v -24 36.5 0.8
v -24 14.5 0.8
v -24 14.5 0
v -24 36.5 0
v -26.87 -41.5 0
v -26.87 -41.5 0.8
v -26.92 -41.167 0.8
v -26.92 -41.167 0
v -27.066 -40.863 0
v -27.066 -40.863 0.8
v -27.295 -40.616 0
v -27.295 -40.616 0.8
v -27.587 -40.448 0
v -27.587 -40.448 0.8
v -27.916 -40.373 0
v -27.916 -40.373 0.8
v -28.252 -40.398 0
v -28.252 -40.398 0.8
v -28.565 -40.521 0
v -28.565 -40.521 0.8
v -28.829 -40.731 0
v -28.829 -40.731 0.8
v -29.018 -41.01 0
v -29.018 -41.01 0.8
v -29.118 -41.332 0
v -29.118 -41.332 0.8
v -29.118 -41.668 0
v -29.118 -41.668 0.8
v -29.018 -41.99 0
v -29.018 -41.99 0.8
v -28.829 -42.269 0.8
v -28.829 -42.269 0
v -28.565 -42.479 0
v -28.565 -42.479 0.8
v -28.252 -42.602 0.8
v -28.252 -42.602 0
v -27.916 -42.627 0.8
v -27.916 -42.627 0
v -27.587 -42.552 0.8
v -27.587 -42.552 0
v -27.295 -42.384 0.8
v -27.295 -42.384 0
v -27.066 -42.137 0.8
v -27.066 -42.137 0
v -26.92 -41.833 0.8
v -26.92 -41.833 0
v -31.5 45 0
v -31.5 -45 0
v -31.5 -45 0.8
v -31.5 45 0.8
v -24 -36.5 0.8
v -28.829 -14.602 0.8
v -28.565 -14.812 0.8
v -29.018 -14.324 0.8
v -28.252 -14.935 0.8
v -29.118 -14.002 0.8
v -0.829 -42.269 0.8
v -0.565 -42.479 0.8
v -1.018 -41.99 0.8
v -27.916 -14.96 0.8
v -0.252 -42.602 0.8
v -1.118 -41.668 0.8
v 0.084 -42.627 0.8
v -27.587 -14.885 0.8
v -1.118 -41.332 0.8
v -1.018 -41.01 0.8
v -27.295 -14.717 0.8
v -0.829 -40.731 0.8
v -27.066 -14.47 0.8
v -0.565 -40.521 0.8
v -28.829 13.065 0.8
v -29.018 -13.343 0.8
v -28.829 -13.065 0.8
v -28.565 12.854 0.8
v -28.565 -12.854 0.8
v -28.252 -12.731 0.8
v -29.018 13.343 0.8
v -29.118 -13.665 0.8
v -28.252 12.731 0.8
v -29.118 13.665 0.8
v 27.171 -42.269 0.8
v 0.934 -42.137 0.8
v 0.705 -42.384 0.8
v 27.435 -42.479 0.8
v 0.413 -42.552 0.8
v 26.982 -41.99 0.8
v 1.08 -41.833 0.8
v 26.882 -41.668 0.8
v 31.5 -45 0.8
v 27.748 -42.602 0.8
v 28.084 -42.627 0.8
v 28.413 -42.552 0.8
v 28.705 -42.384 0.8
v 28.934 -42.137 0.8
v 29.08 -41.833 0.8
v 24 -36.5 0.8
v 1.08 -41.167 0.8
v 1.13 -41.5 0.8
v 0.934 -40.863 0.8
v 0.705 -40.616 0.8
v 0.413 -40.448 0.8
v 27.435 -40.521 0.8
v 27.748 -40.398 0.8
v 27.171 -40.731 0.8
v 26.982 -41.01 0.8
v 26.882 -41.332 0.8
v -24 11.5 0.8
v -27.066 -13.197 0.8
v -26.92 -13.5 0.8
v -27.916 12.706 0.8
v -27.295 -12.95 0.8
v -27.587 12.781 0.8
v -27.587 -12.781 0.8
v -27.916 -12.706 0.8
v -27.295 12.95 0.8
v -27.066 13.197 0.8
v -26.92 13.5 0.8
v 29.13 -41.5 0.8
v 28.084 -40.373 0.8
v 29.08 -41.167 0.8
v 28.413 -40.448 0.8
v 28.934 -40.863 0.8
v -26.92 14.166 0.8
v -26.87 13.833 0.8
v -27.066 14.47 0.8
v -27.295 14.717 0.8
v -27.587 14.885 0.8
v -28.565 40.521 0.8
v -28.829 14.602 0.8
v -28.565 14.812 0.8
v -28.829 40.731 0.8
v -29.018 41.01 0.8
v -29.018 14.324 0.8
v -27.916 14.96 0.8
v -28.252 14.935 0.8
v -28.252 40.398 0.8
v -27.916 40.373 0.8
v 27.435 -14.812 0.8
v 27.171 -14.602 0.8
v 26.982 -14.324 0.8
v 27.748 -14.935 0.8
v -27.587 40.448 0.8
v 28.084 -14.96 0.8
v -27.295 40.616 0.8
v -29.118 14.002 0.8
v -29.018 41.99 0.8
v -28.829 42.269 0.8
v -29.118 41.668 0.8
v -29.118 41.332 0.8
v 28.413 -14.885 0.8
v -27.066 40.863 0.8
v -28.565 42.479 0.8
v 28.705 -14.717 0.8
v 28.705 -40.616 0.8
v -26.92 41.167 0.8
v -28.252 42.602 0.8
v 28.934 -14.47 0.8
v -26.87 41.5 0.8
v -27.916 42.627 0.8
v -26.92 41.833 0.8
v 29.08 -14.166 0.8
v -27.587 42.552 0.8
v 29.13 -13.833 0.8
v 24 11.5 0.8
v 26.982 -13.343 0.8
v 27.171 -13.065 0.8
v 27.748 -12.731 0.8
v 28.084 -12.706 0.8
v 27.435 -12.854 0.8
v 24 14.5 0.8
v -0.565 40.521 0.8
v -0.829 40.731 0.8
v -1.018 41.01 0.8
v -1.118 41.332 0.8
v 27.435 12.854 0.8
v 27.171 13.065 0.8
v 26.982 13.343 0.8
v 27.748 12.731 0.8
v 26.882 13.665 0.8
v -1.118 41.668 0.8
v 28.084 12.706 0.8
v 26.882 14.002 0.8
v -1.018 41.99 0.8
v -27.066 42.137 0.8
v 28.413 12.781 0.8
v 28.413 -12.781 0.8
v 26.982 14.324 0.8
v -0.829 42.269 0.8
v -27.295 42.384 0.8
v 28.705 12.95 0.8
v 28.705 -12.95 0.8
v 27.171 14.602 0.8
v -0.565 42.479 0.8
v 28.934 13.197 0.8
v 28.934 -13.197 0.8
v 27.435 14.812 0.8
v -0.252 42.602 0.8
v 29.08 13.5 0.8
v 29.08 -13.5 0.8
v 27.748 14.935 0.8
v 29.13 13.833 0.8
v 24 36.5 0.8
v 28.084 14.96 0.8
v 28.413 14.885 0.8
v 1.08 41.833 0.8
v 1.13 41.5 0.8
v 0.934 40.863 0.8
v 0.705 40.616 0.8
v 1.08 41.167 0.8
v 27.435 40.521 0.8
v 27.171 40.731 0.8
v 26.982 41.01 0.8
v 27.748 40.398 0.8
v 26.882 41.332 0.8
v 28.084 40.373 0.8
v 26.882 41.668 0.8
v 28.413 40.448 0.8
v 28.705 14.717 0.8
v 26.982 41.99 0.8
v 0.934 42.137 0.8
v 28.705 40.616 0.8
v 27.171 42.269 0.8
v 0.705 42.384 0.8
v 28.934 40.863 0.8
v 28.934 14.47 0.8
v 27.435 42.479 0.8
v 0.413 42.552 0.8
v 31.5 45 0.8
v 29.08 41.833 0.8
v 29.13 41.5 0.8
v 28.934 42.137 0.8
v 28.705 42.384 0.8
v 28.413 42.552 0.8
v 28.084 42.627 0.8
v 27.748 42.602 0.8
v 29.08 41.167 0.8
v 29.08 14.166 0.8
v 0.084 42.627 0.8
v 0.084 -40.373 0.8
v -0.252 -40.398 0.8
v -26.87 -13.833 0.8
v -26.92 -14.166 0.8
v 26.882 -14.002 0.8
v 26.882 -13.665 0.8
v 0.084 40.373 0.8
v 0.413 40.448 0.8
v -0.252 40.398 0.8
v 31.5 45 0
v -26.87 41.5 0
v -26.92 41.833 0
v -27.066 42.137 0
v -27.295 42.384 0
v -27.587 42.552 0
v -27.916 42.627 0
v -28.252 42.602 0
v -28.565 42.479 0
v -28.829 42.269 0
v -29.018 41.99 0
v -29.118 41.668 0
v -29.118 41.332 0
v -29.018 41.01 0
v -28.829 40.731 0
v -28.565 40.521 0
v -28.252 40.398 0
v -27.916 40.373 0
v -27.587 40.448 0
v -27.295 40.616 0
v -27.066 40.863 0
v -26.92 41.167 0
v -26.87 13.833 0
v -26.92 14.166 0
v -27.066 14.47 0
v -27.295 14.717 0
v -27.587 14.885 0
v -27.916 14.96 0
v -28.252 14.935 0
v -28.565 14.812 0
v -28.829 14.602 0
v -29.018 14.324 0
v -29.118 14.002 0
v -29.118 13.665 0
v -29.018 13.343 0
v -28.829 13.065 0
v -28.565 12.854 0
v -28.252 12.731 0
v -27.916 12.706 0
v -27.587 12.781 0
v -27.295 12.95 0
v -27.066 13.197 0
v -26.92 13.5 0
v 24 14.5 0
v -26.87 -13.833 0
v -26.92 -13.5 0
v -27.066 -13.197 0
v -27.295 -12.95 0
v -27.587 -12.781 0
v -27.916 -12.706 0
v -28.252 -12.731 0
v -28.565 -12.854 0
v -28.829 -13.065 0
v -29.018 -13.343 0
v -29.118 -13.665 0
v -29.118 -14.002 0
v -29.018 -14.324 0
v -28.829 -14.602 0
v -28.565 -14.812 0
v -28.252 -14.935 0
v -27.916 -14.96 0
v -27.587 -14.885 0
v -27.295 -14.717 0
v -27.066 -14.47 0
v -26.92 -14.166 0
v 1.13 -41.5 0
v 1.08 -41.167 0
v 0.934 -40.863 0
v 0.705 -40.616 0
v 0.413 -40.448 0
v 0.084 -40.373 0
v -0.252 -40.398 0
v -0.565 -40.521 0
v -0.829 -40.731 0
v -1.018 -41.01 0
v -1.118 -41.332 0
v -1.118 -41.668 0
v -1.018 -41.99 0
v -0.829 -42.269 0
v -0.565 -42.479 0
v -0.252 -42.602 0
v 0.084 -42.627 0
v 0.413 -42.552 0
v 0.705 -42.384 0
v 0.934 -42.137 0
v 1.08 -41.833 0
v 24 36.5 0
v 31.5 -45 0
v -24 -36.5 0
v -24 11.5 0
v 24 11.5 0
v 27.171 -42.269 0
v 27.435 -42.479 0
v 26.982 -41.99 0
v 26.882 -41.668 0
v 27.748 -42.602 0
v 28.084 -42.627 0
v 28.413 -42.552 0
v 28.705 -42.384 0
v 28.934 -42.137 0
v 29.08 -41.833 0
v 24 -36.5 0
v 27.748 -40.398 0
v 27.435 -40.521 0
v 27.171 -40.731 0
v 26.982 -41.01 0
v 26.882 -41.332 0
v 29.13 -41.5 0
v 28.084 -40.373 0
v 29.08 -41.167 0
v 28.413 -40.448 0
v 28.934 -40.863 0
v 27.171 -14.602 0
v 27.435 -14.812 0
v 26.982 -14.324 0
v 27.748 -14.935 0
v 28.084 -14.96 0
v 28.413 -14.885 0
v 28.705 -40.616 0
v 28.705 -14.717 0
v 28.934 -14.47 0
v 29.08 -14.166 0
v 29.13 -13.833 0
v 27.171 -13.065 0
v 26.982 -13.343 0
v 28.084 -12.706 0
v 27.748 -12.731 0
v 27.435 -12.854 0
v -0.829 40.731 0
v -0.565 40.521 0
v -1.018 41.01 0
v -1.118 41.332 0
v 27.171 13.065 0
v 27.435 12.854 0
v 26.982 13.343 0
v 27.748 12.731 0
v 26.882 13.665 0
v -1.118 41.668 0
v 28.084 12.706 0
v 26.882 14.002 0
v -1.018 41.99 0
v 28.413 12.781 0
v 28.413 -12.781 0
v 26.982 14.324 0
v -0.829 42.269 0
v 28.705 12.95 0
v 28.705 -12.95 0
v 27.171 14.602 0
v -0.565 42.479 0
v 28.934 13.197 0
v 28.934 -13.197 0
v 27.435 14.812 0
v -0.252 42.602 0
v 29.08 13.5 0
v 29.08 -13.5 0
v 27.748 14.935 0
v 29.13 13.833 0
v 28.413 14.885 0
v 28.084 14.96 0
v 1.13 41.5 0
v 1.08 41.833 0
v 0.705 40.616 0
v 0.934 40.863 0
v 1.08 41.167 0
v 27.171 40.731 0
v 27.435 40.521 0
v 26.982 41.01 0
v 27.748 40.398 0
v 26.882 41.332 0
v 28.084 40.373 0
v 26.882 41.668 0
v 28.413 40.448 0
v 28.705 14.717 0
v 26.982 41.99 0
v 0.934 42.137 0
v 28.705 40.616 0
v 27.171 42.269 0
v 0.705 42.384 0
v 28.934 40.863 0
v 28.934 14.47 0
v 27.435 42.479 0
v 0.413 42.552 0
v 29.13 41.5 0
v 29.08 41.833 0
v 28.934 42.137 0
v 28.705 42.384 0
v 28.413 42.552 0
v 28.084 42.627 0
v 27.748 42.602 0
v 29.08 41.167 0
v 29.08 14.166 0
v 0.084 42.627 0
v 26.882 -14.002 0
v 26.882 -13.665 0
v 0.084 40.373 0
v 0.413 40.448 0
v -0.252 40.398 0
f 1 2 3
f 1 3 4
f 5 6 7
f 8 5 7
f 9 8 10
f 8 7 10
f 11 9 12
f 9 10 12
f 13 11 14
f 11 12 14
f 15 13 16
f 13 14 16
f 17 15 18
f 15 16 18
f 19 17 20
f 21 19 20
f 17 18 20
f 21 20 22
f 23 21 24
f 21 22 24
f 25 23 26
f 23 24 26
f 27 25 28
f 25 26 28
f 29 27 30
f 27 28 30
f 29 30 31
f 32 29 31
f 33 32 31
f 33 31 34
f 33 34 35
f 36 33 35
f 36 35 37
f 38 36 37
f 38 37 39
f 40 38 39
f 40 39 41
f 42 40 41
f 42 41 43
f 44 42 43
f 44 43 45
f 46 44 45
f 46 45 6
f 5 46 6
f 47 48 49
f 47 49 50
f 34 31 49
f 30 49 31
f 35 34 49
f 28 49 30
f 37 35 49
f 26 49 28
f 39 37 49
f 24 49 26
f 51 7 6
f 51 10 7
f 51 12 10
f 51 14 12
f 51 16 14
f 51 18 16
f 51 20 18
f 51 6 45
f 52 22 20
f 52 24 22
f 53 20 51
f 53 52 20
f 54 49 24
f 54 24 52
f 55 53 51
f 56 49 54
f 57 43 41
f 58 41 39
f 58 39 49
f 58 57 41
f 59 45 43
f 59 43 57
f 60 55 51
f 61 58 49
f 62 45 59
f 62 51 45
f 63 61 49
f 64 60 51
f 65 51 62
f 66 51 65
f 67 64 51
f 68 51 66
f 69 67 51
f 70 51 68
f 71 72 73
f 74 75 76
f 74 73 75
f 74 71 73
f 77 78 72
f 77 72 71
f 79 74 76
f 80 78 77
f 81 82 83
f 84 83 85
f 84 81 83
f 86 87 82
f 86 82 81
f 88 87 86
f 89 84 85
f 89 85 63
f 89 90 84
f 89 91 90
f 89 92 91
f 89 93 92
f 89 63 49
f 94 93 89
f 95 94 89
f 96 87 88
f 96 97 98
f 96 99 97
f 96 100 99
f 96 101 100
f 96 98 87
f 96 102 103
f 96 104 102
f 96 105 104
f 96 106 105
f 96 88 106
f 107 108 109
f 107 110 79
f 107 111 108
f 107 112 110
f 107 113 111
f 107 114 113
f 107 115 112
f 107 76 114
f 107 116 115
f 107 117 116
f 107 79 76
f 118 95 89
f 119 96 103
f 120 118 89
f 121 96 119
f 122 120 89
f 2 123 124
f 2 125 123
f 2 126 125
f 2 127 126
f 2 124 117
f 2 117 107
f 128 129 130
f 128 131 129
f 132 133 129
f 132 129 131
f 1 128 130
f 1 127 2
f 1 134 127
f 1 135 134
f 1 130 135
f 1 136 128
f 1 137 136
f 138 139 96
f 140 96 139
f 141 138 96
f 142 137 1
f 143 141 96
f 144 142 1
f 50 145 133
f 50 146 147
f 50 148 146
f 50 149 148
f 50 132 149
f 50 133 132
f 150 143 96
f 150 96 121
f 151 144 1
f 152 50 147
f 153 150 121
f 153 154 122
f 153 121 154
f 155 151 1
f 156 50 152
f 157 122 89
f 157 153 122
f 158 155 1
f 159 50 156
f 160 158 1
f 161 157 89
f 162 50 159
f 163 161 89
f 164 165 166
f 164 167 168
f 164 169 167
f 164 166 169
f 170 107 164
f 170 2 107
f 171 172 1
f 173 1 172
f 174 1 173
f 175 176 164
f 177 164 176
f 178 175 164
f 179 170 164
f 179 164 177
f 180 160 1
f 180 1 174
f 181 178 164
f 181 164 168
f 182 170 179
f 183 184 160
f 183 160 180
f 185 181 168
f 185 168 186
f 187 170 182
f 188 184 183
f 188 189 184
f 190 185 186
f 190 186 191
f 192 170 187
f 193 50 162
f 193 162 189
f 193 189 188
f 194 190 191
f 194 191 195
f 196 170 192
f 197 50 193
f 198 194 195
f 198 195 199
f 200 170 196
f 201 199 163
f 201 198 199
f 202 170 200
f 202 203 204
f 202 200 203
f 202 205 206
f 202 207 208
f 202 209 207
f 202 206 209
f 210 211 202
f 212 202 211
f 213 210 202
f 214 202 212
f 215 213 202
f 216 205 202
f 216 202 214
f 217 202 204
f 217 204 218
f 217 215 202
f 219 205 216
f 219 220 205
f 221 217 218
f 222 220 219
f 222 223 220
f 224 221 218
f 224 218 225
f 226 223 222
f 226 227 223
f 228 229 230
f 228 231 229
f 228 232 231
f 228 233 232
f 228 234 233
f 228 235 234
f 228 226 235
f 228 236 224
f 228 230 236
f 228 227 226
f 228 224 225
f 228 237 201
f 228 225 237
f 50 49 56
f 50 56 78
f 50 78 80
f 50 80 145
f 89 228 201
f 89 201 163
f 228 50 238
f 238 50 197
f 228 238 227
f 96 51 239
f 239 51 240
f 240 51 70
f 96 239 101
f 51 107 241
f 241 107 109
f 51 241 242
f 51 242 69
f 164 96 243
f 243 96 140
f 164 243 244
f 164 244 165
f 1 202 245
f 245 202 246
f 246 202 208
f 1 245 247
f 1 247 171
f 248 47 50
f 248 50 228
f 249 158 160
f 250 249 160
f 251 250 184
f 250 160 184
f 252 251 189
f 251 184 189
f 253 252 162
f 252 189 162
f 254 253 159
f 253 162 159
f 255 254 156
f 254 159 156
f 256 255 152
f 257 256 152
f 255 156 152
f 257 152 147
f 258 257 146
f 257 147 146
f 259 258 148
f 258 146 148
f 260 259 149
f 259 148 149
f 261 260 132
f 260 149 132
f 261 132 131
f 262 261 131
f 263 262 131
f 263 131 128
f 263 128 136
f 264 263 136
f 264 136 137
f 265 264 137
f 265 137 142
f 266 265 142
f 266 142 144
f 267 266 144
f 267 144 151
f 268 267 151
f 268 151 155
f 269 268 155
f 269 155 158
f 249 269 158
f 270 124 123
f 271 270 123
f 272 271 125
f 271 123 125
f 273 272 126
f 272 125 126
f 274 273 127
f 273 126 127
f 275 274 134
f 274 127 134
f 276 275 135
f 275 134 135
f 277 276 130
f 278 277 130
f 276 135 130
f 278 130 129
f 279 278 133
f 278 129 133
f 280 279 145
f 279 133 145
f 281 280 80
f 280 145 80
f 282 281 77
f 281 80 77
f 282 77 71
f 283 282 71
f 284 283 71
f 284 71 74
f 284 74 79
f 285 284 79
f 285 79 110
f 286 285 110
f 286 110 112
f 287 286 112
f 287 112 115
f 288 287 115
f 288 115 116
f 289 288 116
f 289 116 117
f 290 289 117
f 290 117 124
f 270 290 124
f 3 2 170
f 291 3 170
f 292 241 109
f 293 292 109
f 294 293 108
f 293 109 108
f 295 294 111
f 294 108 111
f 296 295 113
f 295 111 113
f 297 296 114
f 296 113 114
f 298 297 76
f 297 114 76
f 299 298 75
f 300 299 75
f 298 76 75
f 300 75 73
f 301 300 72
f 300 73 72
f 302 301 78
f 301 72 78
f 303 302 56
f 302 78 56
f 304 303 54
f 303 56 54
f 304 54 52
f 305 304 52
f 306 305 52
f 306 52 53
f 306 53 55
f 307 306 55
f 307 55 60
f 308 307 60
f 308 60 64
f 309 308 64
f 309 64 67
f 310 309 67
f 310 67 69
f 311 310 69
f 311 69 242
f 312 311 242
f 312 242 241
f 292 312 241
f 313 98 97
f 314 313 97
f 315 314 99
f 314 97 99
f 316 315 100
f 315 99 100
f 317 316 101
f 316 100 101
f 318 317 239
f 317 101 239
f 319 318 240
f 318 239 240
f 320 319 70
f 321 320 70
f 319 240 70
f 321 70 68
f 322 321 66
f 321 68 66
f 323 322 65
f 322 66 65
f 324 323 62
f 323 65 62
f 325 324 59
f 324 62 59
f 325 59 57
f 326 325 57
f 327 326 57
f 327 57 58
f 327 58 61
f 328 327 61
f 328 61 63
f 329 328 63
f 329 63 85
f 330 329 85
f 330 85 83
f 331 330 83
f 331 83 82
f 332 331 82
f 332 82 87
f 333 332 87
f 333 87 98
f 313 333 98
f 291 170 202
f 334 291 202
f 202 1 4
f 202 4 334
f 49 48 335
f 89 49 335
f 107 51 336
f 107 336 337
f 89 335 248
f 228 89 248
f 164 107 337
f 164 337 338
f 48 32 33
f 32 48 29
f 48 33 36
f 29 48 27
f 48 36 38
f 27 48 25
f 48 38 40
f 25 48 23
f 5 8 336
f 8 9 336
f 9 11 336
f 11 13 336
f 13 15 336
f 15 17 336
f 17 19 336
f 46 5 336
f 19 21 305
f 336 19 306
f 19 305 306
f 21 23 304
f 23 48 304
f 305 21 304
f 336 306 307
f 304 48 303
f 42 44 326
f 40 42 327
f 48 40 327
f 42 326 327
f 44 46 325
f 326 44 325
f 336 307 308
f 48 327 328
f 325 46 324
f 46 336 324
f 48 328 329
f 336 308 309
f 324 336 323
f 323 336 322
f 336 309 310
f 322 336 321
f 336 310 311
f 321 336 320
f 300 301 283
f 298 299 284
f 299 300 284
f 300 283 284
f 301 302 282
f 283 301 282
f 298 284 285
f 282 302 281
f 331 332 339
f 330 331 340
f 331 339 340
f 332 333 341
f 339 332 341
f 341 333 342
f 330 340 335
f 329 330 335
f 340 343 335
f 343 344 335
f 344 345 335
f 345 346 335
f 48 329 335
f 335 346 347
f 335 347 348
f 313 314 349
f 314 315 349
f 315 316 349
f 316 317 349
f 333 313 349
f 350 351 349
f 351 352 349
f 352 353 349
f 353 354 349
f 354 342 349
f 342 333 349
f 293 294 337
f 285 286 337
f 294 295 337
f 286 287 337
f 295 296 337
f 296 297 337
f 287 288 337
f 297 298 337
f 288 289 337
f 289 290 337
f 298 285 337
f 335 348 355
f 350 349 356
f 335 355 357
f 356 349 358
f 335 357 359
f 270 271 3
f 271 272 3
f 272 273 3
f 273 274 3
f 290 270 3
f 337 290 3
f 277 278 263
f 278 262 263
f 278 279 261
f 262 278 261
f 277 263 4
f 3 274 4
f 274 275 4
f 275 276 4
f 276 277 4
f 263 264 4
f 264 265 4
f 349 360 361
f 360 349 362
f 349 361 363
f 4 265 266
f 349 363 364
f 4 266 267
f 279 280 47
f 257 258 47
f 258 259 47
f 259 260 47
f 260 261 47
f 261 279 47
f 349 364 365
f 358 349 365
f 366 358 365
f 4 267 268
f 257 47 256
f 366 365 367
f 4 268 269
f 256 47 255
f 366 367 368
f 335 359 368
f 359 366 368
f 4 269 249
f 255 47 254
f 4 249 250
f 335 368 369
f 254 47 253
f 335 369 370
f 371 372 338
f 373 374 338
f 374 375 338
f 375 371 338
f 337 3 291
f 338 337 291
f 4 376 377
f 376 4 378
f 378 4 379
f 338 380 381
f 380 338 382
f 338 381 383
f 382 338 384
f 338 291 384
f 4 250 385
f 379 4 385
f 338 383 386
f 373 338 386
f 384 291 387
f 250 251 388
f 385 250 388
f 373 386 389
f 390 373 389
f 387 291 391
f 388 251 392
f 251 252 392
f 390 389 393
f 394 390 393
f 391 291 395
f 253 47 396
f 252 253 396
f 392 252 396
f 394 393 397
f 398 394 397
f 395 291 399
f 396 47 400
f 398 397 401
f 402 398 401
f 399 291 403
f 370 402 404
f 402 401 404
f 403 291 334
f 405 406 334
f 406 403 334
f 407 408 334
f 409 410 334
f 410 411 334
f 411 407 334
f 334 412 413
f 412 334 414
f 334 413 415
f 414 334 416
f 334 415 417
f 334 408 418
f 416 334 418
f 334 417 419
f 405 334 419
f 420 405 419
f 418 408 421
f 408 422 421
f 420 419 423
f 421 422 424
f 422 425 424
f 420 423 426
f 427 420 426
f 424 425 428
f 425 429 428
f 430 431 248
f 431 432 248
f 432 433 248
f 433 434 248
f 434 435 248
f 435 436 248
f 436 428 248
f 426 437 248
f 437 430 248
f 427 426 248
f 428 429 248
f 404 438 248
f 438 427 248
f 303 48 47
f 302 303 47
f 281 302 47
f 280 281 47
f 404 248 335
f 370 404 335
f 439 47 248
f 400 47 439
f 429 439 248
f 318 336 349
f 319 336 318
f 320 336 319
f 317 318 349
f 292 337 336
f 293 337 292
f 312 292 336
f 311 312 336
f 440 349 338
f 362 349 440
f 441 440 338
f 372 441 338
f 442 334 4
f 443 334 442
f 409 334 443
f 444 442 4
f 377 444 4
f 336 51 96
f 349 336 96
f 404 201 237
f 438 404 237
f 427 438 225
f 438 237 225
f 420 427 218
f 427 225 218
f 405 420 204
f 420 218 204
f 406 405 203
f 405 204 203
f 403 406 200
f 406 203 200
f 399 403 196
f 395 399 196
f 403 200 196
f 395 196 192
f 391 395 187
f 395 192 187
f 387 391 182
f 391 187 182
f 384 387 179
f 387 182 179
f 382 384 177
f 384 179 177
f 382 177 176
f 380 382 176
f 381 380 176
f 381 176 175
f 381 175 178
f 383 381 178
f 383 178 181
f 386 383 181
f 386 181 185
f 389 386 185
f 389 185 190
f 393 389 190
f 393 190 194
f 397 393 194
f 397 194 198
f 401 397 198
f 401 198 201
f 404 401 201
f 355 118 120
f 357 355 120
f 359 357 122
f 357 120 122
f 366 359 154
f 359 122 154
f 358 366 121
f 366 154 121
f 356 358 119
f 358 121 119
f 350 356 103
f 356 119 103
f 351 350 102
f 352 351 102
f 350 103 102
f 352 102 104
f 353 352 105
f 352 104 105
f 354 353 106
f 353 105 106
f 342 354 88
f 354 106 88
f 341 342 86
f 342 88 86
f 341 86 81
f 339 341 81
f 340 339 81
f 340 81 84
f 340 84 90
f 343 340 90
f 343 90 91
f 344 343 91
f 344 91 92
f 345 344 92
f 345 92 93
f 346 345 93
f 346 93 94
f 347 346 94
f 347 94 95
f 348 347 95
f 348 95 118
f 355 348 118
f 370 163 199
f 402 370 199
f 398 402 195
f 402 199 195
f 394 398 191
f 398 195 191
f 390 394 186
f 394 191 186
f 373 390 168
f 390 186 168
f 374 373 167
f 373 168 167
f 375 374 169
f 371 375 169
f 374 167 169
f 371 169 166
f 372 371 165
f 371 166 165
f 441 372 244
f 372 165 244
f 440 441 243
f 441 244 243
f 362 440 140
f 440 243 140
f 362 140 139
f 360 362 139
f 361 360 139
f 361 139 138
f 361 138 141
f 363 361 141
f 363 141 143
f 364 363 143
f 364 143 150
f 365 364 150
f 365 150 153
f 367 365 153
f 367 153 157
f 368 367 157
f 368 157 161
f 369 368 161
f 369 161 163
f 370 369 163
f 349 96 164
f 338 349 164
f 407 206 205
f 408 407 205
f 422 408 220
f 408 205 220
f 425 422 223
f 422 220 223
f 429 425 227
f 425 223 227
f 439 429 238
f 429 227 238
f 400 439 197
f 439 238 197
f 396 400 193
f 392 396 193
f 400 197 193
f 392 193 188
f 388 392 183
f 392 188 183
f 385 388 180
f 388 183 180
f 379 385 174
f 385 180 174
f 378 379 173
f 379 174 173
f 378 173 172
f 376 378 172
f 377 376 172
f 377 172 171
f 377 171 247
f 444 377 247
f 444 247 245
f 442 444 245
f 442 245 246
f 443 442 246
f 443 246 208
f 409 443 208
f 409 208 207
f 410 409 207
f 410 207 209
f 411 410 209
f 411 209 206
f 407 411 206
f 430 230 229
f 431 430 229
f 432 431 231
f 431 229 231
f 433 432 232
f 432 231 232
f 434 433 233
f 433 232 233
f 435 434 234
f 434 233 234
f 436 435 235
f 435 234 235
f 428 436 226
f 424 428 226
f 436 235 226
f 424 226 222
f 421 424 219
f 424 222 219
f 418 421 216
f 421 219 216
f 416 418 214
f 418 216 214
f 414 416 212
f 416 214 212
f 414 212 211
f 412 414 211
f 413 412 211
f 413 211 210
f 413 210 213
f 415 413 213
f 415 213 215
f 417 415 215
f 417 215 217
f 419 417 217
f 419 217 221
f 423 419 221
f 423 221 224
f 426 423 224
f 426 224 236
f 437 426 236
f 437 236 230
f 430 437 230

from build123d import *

# Parameters (mm, degrees)
F0_W     = 63
F0_H     = 90
F1_DEPTH = 0.8
F3_R     = 1.1303
F4_DEPTH = 25
F5_W     = 48
F5_H     = 22
F5_H_2   = 48
F6_DEPTH = 25


with BuildPart() as f1:
    # F0 (on Top) → F1 (new body)
    with BuildSketch(Plane.XY):
        Rectangle(F0_W, F0_H)
    extrude(amount=F1_DEPTH)

    # F3 (on face) → F4 (cut)
    with BuildSketch(Plane.XY.offset(0.8)):
        with Locations((-28, 41.5)):
            Circle(F3_R)
        with Locations((-28, -41.5)):
            Circle(F3_R)
        with Locations((28, -41.5)):
            Circle(F3_R)
        with Locations((28, 41.5)):
            Circle(F3_R)
        with Locations((0, 41.5)):
            Circle(F3_R)
        with Locations((0, -41.5)):
            Circle(F3_R)
        with Locations((-28, 13.833333)):
            Circle(F3_R)
        with Locations((-28, -13.833333)):
            Circle(F3_R)
        with Locations((28, 13.833333)):
            Circle(F3_R)
        with Locations((28, -13.833333)):
            Circle(F3_R)
    extrude(amount=-F4_DEPTH, mode=Mode.SUBTRACT)

    # F5 (on face) → F6 (cut)
    with BuildSketch(Plane.XY.offset(0.8)):
        with Locations((0, 25.5)):
            Rectangle(F5_W, F5_H)
        with Locations((0, -12.5)):
            Rectangle(F5_W, F5_H_2)
    extrude(amount=-F6_DEPTH, mode=Mode.SUBTRACT)


solid = f1.part
